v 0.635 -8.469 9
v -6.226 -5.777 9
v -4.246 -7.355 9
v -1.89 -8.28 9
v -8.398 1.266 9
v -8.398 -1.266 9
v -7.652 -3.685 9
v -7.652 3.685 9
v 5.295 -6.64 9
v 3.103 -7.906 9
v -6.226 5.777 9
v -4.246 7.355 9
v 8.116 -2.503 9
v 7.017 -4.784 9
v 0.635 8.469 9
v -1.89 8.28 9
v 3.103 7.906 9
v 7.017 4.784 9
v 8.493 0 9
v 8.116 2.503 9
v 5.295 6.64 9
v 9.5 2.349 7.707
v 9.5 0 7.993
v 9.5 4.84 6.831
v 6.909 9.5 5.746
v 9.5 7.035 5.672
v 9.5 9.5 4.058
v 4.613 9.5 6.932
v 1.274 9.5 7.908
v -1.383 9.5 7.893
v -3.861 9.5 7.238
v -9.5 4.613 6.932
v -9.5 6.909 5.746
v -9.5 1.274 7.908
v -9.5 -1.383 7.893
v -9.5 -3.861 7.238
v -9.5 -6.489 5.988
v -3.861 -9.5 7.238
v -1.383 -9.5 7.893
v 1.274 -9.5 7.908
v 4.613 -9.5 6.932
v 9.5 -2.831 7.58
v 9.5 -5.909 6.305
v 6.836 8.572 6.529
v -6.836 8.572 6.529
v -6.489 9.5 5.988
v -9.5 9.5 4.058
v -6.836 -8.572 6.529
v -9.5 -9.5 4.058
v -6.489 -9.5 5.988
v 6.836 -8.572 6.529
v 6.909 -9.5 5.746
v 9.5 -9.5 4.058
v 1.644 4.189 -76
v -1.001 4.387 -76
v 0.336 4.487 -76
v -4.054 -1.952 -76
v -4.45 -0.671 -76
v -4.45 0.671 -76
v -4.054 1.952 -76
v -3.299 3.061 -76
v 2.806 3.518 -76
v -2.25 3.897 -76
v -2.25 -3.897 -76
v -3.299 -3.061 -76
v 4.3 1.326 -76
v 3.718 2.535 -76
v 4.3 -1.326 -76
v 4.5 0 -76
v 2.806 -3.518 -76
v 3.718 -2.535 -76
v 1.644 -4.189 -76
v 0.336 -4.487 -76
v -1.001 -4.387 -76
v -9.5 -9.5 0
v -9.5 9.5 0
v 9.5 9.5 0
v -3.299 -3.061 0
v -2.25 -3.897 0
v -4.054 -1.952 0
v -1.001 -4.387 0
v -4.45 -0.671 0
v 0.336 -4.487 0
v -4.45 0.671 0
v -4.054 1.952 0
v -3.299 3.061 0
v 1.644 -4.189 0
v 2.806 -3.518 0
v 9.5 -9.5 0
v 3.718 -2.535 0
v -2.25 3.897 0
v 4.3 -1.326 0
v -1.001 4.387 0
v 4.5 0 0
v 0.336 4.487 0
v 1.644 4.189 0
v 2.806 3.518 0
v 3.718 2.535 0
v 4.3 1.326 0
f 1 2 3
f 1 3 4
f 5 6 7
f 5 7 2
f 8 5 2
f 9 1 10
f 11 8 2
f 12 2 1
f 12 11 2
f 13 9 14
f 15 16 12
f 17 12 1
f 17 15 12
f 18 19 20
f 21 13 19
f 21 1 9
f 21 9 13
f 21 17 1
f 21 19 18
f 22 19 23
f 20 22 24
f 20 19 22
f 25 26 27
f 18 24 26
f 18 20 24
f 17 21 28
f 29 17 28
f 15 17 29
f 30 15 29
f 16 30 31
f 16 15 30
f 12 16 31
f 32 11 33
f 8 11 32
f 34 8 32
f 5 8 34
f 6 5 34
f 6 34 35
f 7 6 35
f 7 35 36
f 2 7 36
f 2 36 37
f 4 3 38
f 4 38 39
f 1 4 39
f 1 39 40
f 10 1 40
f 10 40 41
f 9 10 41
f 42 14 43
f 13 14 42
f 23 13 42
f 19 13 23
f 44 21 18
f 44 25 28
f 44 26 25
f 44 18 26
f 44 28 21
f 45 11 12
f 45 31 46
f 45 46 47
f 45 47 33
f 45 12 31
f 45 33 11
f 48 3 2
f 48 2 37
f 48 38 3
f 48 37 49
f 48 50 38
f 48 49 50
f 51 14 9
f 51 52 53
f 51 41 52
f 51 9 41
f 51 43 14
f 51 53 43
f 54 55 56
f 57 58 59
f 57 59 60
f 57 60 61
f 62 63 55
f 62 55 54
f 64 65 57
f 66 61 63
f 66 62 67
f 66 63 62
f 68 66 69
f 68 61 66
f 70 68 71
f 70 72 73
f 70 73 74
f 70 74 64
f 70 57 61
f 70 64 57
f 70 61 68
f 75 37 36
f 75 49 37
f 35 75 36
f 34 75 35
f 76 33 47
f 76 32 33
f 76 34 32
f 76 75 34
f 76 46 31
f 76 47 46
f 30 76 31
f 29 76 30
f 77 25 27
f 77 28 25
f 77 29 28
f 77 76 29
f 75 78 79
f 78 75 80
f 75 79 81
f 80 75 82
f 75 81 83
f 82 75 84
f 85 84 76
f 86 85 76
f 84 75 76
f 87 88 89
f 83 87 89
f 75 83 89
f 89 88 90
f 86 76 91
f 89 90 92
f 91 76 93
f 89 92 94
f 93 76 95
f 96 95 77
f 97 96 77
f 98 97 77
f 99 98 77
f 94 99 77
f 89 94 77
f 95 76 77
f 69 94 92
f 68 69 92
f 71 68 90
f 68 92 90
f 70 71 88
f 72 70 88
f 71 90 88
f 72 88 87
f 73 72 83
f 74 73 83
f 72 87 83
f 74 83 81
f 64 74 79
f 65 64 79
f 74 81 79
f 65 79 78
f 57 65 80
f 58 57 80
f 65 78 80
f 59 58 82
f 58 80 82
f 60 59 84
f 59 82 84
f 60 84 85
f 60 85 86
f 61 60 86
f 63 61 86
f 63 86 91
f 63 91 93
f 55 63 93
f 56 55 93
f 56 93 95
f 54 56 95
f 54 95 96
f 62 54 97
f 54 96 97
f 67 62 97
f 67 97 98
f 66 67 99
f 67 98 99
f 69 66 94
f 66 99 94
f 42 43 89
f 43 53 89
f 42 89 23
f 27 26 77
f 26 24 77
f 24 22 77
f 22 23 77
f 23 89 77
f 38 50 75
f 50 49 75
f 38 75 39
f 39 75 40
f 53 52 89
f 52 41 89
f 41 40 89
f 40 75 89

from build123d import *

# Parameters (mm, degrees)
SKETCH1_W           = 19
SKETCH1_H           = 19
BOSS_EXTRUDE1_DEPTH = 9
SKETCH2_OUTSIDE_W   = 44.668
SKETCH2_OUTSIDE_H   = 44.668
SKETCH2_OUTSIDE_R   = 8.492914758
CUT_EXTRUDE1_DEPTH  = 9
CUT_EXTRUDE1_DRAFT  = -45
SKETCH3_R           = 4.5
BOSS_EXTRUDE2_DEPTH = 76


with BuildPart() as part:
    # Sketch1 → Boss-Extrude1 (new body)
    with BuildSketch(Plane.XY):
        Rectangle(SKETCH1_W, SKETCH1_H)
    extrude(amount=BOSS_EXTRUDE1_DEPTH)


with BuildPart() as cut_extrude1_tool:
    # Sketch2 outside → Cut-Extrude1 (with draft: the straight prism first)
    with BuildSketch(Plane.XY.offset(9)):
        Rectangle(SKETCH2_OUTSIDE_W, SKETCH2_OUTSIDE_H)
        Circle(SKETCH2_OUTSIDE_R, mode=Mode.SUBTRACT)
    extrude(amount=-CUT_EXTRUDE1_DEPTH)
    # Cut-Extrude1: the draft: its side faces are tilted about the plane it starts from
    cut_extrude1_sides = [cut_extrude1_tool.faces().sort_by_distance(p)[0] for p in [
        (0, -22.334, 4.5),
        (22.334, 0, 4.5),
        (0, 22.334, 4.5),
        (-22.334, 0, 4.5),
        (-8.492914758, 0, 4.5),
    ]]
    draft(cut_extrude1_sides, Plane.XY.offset(9), CUT_EXTRUDE1_DRAFT)


with BuildPart() as part_1:
    add(part.part)

    # Cut-Extrude1: cut by cut_extrude1_tool
    add(cut_extrude1_tool.part, mode=Mode.SUBTRACT)

    # Sketch3 → Boss-Extrude2 (add)
    with BuildSketch(Plane(origin=(0, 0, 0), x_dir=(-1, 0, 0), z_dir=(0, 0, -1))):
        with Locations(Location((0, 0, 0), (0, 0, 180))):  # turned: the seam where the file's is
            Circle(SKETCH3_R)
    extrude(amount=BOSS_EXTRUDE2_DEPTH)


solid = part_1.part
